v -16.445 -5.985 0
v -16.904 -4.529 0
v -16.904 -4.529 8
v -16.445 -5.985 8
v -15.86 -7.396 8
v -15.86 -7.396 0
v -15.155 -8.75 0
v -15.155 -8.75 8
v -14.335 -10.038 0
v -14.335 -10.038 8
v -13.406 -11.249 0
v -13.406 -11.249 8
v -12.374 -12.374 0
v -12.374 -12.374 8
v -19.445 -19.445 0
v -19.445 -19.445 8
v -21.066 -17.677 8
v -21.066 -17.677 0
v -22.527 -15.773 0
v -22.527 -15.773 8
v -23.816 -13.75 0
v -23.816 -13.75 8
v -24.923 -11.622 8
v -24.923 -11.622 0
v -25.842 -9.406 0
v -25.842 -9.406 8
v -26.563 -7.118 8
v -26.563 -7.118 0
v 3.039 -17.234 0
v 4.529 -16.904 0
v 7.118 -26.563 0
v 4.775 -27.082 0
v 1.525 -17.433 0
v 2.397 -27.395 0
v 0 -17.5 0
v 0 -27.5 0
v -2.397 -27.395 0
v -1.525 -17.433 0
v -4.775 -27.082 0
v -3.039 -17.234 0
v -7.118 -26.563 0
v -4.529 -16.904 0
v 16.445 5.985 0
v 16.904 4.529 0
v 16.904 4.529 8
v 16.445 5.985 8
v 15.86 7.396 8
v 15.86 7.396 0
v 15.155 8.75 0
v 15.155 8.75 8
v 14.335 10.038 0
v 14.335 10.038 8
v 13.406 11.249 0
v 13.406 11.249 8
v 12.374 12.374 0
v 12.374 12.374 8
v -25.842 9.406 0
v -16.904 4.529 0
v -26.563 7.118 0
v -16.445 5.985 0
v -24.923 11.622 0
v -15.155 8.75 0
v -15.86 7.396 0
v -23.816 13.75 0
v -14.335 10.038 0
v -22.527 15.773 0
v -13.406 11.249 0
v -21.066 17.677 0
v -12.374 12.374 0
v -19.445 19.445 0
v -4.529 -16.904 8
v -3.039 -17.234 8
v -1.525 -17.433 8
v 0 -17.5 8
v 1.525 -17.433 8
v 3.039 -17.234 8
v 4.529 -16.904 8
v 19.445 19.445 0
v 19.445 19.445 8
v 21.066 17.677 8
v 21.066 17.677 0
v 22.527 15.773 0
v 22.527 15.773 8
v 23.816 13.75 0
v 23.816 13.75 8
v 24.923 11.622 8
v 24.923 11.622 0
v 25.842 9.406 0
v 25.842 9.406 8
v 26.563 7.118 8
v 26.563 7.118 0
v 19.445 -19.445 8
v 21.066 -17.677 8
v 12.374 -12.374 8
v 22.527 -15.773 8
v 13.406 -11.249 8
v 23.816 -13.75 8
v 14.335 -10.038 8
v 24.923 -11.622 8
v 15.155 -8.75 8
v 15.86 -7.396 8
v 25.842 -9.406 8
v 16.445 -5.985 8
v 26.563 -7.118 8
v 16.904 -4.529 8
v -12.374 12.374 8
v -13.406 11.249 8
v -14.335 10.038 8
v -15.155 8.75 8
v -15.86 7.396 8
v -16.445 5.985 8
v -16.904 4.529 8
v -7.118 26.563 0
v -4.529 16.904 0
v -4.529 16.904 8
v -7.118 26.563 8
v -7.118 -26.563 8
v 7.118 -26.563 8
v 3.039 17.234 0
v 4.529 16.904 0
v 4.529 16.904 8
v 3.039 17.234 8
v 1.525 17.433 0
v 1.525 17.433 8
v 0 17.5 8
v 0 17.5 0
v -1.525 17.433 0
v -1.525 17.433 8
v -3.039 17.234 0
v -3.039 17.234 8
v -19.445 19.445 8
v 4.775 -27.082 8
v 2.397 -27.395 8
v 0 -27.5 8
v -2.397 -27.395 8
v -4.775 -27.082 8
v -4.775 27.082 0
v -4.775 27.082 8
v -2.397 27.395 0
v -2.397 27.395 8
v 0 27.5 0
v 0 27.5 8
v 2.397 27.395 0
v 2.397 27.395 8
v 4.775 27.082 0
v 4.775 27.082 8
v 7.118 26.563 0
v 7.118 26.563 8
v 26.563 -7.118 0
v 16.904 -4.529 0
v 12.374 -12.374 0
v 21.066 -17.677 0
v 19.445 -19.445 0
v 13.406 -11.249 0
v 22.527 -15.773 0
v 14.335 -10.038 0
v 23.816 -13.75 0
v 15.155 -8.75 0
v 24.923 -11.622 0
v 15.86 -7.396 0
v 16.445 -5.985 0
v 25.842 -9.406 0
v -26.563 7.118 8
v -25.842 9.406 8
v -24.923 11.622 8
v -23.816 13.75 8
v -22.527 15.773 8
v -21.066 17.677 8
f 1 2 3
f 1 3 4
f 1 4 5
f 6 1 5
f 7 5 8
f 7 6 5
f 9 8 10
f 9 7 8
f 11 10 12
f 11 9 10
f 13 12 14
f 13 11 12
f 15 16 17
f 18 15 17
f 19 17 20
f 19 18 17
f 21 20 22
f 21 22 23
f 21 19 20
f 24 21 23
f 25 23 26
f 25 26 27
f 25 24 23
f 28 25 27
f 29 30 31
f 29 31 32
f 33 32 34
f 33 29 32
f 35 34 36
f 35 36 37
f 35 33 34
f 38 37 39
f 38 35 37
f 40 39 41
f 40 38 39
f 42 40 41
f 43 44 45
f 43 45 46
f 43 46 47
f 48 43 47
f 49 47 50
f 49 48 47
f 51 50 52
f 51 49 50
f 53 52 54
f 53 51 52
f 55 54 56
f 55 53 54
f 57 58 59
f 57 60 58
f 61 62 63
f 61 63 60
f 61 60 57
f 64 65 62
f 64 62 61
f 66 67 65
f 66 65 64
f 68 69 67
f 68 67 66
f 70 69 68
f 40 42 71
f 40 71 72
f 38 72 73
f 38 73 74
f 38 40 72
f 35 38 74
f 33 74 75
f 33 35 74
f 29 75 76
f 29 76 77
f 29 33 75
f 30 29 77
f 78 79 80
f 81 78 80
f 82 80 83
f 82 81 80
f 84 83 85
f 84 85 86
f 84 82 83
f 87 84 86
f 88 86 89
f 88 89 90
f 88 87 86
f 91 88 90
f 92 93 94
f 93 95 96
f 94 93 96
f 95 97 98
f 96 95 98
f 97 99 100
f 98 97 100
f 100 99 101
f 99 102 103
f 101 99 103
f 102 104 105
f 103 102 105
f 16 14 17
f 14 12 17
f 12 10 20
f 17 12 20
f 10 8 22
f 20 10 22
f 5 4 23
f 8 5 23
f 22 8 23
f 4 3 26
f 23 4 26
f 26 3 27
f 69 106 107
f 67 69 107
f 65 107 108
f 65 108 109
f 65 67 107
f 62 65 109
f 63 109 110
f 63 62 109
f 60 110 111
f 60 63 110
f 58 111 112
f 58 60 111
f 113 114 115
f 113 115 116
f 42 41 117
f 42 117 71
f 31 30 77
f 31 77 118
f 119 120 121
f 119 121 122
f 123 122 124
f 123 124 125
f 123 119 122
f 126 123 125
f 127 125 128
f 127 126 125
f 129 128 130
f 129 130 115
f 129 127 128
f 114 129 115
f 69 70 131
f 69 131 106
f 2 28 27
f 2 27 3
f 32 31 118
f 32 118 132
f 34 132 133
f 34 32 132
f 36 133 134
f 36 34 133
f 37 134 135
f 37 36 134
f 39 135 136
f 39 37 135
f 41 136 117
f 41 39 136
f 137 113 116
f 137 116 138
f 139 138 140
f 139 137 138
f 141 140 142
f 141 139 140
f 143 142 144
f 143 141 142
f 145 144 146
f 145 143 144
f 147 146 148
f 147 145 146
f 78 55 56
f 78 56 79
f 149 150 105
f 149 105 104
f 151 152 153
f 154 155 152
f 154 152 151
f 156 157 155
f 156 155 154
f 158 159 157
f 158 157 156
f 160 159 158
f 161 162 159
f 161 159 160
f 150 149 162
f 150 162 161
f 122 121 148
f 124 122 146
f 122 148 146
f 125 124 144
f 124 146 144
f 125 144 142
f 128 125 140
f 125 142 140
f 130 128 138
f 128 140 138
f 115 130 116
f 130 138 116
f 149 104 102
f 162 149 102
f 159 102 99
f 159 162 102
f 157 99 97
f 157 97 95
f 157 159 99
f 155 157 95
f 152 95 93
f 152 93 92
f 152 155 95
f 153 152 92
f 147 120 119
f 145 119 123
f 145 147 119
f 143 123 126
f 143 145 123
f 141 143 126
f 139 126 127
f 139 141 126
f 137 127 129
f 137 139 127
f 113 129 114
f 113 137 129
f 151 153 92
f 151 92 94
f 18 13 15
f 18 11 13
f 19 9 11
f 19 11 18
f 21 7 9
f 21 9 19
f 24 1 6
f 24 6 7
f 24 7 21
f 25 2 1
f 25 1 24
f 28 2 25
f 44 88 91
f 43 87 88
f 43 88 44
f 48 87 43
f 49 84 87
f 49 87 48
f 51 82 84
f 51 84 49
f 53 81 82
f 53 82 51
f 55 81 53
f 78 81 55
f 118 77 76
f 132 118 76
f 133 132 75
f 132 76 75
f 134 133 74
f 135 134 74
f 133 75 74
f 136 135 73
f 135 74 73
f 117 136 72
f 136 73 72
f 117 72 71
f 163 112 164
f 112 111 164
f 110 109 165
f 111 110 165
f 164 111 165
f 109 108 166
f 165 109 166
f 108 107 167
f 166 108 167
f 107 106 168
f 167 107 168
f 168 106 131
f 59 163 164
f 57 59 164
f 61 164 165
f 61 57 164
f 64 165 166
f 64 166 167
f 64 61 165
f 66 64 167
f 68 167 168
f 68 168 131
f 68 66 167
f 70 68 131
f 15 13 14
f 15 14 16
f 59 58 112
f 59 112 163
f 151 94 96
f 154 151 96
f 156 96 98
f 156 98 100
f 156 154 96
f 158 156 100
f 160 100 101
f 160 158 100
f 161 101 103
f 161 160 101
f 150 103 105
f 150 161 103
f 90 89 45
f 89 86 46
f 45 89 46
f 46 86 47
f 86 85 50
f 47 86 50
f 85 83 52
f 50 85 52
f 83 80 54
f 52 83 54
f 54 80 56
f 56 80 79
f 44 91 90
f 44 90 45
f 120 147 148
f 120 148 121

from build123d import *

# Parameters (mm, degrees)
BOSS_EXTRUDE1_DEPTH   = 8
BOSS_EXTRUDE1_2_DEPTH = 8
BOSS_EXTRUDE1_3_DEPTH = 8
BOSS_EXTRUDE1_4_DEPTH = 8
BOSS_EXTRUDE1_5_DEPTH = 8
BOSS_EXTRUDE1_6_DEPTH = 8


with BuildPart() as part:
    # Sketch1 → Boss-Extrude1 (new body)
    with BuildSketch(Plane.XY):
        with BuildLine():
            Line((-4.529333289, 16.90370196), (-7.11752374, 26.562960223))
            ThreePointArc((-7.11752374, 26.562960223), (0, 27.5), (7.11752374, 26.562960223))
            Line((7.11752374, 26.562960223), (4.529333289, 16.90370196))
            ThreePointArc((4.529333289, 16.90370196), (0, 17.5), (-4.529333289, 16.90370196))
        make_face()
    extrude(amount=BOSS_EXTRUDE1_DEPTH)


with BuildPart() as body_2:
    # Sketch1 → Boss-Extrude1 2 (new body)
    with BuildSketch(Plane.XY):
        with BuildLine():
            Line((12.374368671, 12.374368671), (19.445436483, 19.445436483))
            ThreePointArc((19.445436483, 19.445436483), (23.815698604, 13.75), (26.562960223, 7.11752374))
            Line((26.562960223, 7.11752374), (16.90370196, 4.529333289))
            ThreePointArc((16.90370196, 4.529333289), (15.155444566, 8.75), (12.374368671, 12.374368671))
        make_face()
    extrude(amount=BOSS_EXTRUDE1_2_DEPTH)


with BuildPart() as body_3:
    # Sketch1 → Boss-Extrude1 3 (new body)
    with BuildSketch(Plane.XY):
        with BuildLine():
            Line((16.90370196, -4.529333289), (26.562960223, -7.11752374))
            ThreePointArc((26.562960223, -7.11752374), (23.815698604, -13.75), (19.445436483, -19.445436483))
            Line((19.445436483, -19.445436483), (12.374368671, -12.374368671))
            ThreePointArc((12.374368671, -12.374368671), (15.155444566, -8.75), (16.90370196, -4.529333289))
        make_face()
    extrude(amount=BOSS_EXTRUDE1_3_DEPTH)


with BuildPart() as body_4:
    # Sketch1 → Boss-Extrude1 4 (new body)
    with BuildSketch(Plane.XY):
        with BuildLine():
            Line((4.529333289, -16.90370196), (7.11752374, -26.562960223))
            ThreePointArc((7.11752374, -26.562960223), (0, -27.5), (-7.11752374, -26.562960223))
            Line((-7.11752374, -26.562960223), (-4.529333289, -16.90370196))
            ThreePointArc((-4.529333289, -16.90370196), (0, -17.5), (4.529333289, -16.90370196))
        make_face()
    extrude(amount=BOSS_EXTRUDE1_4_DEPTH)


with BuildPart() as body_5:
    # Sketch1 → Boss-Extrude1 5 (new body)
    with BuildSketch(Plane.XY):
        with BuildLine():
            Line((-12.374368671, -12.374368671), (-19.445436483, -19.445436483))
            ThreePointArc((-19.445436483, -19.445436483), (-23.815698604, -13.75), (-26.562960223, -7.11752374))
            Line((-26.562960223, -7.11752374), (-16.90370196, -4.529333289))
            ThreePointArc((-16.90370196, -4.529333289), (-15.155444566, -8.75), (-12.374368671, -12.374368671))
        make_face()
    extrude(amount=BOSS_EXTRUDE1_5_DEPTH)


with BuildPart() as body_6:
    # Sketch1 → Boss-Extrude1 6 (new body)
    with BuildSketch(Plane.XY):
        with BuildLine():
            Line((-16.90370196, 4.529333289), (-26.562960223, 7.11752374))
            ThreePointArc((-26.562960223, 7.11752374), (-23.815698604, 13.75), (-19.445436483, 19.445436483))
            Line((-19.445436483, 19.445436483), (-12.374368671, 12.374368671))
            ThreePointArc((-12.374368671, 12.374368671), (-15.155444566, 8.75), (-16.90370196, 4.529333289))
        make_face()
    extrude(amount=BOSS_EXTRUDE1_6_DEPTH)


solid = Compound([part.part, body_2.part, body_3.part, body_4.part, body_5.part, body_6.part])
